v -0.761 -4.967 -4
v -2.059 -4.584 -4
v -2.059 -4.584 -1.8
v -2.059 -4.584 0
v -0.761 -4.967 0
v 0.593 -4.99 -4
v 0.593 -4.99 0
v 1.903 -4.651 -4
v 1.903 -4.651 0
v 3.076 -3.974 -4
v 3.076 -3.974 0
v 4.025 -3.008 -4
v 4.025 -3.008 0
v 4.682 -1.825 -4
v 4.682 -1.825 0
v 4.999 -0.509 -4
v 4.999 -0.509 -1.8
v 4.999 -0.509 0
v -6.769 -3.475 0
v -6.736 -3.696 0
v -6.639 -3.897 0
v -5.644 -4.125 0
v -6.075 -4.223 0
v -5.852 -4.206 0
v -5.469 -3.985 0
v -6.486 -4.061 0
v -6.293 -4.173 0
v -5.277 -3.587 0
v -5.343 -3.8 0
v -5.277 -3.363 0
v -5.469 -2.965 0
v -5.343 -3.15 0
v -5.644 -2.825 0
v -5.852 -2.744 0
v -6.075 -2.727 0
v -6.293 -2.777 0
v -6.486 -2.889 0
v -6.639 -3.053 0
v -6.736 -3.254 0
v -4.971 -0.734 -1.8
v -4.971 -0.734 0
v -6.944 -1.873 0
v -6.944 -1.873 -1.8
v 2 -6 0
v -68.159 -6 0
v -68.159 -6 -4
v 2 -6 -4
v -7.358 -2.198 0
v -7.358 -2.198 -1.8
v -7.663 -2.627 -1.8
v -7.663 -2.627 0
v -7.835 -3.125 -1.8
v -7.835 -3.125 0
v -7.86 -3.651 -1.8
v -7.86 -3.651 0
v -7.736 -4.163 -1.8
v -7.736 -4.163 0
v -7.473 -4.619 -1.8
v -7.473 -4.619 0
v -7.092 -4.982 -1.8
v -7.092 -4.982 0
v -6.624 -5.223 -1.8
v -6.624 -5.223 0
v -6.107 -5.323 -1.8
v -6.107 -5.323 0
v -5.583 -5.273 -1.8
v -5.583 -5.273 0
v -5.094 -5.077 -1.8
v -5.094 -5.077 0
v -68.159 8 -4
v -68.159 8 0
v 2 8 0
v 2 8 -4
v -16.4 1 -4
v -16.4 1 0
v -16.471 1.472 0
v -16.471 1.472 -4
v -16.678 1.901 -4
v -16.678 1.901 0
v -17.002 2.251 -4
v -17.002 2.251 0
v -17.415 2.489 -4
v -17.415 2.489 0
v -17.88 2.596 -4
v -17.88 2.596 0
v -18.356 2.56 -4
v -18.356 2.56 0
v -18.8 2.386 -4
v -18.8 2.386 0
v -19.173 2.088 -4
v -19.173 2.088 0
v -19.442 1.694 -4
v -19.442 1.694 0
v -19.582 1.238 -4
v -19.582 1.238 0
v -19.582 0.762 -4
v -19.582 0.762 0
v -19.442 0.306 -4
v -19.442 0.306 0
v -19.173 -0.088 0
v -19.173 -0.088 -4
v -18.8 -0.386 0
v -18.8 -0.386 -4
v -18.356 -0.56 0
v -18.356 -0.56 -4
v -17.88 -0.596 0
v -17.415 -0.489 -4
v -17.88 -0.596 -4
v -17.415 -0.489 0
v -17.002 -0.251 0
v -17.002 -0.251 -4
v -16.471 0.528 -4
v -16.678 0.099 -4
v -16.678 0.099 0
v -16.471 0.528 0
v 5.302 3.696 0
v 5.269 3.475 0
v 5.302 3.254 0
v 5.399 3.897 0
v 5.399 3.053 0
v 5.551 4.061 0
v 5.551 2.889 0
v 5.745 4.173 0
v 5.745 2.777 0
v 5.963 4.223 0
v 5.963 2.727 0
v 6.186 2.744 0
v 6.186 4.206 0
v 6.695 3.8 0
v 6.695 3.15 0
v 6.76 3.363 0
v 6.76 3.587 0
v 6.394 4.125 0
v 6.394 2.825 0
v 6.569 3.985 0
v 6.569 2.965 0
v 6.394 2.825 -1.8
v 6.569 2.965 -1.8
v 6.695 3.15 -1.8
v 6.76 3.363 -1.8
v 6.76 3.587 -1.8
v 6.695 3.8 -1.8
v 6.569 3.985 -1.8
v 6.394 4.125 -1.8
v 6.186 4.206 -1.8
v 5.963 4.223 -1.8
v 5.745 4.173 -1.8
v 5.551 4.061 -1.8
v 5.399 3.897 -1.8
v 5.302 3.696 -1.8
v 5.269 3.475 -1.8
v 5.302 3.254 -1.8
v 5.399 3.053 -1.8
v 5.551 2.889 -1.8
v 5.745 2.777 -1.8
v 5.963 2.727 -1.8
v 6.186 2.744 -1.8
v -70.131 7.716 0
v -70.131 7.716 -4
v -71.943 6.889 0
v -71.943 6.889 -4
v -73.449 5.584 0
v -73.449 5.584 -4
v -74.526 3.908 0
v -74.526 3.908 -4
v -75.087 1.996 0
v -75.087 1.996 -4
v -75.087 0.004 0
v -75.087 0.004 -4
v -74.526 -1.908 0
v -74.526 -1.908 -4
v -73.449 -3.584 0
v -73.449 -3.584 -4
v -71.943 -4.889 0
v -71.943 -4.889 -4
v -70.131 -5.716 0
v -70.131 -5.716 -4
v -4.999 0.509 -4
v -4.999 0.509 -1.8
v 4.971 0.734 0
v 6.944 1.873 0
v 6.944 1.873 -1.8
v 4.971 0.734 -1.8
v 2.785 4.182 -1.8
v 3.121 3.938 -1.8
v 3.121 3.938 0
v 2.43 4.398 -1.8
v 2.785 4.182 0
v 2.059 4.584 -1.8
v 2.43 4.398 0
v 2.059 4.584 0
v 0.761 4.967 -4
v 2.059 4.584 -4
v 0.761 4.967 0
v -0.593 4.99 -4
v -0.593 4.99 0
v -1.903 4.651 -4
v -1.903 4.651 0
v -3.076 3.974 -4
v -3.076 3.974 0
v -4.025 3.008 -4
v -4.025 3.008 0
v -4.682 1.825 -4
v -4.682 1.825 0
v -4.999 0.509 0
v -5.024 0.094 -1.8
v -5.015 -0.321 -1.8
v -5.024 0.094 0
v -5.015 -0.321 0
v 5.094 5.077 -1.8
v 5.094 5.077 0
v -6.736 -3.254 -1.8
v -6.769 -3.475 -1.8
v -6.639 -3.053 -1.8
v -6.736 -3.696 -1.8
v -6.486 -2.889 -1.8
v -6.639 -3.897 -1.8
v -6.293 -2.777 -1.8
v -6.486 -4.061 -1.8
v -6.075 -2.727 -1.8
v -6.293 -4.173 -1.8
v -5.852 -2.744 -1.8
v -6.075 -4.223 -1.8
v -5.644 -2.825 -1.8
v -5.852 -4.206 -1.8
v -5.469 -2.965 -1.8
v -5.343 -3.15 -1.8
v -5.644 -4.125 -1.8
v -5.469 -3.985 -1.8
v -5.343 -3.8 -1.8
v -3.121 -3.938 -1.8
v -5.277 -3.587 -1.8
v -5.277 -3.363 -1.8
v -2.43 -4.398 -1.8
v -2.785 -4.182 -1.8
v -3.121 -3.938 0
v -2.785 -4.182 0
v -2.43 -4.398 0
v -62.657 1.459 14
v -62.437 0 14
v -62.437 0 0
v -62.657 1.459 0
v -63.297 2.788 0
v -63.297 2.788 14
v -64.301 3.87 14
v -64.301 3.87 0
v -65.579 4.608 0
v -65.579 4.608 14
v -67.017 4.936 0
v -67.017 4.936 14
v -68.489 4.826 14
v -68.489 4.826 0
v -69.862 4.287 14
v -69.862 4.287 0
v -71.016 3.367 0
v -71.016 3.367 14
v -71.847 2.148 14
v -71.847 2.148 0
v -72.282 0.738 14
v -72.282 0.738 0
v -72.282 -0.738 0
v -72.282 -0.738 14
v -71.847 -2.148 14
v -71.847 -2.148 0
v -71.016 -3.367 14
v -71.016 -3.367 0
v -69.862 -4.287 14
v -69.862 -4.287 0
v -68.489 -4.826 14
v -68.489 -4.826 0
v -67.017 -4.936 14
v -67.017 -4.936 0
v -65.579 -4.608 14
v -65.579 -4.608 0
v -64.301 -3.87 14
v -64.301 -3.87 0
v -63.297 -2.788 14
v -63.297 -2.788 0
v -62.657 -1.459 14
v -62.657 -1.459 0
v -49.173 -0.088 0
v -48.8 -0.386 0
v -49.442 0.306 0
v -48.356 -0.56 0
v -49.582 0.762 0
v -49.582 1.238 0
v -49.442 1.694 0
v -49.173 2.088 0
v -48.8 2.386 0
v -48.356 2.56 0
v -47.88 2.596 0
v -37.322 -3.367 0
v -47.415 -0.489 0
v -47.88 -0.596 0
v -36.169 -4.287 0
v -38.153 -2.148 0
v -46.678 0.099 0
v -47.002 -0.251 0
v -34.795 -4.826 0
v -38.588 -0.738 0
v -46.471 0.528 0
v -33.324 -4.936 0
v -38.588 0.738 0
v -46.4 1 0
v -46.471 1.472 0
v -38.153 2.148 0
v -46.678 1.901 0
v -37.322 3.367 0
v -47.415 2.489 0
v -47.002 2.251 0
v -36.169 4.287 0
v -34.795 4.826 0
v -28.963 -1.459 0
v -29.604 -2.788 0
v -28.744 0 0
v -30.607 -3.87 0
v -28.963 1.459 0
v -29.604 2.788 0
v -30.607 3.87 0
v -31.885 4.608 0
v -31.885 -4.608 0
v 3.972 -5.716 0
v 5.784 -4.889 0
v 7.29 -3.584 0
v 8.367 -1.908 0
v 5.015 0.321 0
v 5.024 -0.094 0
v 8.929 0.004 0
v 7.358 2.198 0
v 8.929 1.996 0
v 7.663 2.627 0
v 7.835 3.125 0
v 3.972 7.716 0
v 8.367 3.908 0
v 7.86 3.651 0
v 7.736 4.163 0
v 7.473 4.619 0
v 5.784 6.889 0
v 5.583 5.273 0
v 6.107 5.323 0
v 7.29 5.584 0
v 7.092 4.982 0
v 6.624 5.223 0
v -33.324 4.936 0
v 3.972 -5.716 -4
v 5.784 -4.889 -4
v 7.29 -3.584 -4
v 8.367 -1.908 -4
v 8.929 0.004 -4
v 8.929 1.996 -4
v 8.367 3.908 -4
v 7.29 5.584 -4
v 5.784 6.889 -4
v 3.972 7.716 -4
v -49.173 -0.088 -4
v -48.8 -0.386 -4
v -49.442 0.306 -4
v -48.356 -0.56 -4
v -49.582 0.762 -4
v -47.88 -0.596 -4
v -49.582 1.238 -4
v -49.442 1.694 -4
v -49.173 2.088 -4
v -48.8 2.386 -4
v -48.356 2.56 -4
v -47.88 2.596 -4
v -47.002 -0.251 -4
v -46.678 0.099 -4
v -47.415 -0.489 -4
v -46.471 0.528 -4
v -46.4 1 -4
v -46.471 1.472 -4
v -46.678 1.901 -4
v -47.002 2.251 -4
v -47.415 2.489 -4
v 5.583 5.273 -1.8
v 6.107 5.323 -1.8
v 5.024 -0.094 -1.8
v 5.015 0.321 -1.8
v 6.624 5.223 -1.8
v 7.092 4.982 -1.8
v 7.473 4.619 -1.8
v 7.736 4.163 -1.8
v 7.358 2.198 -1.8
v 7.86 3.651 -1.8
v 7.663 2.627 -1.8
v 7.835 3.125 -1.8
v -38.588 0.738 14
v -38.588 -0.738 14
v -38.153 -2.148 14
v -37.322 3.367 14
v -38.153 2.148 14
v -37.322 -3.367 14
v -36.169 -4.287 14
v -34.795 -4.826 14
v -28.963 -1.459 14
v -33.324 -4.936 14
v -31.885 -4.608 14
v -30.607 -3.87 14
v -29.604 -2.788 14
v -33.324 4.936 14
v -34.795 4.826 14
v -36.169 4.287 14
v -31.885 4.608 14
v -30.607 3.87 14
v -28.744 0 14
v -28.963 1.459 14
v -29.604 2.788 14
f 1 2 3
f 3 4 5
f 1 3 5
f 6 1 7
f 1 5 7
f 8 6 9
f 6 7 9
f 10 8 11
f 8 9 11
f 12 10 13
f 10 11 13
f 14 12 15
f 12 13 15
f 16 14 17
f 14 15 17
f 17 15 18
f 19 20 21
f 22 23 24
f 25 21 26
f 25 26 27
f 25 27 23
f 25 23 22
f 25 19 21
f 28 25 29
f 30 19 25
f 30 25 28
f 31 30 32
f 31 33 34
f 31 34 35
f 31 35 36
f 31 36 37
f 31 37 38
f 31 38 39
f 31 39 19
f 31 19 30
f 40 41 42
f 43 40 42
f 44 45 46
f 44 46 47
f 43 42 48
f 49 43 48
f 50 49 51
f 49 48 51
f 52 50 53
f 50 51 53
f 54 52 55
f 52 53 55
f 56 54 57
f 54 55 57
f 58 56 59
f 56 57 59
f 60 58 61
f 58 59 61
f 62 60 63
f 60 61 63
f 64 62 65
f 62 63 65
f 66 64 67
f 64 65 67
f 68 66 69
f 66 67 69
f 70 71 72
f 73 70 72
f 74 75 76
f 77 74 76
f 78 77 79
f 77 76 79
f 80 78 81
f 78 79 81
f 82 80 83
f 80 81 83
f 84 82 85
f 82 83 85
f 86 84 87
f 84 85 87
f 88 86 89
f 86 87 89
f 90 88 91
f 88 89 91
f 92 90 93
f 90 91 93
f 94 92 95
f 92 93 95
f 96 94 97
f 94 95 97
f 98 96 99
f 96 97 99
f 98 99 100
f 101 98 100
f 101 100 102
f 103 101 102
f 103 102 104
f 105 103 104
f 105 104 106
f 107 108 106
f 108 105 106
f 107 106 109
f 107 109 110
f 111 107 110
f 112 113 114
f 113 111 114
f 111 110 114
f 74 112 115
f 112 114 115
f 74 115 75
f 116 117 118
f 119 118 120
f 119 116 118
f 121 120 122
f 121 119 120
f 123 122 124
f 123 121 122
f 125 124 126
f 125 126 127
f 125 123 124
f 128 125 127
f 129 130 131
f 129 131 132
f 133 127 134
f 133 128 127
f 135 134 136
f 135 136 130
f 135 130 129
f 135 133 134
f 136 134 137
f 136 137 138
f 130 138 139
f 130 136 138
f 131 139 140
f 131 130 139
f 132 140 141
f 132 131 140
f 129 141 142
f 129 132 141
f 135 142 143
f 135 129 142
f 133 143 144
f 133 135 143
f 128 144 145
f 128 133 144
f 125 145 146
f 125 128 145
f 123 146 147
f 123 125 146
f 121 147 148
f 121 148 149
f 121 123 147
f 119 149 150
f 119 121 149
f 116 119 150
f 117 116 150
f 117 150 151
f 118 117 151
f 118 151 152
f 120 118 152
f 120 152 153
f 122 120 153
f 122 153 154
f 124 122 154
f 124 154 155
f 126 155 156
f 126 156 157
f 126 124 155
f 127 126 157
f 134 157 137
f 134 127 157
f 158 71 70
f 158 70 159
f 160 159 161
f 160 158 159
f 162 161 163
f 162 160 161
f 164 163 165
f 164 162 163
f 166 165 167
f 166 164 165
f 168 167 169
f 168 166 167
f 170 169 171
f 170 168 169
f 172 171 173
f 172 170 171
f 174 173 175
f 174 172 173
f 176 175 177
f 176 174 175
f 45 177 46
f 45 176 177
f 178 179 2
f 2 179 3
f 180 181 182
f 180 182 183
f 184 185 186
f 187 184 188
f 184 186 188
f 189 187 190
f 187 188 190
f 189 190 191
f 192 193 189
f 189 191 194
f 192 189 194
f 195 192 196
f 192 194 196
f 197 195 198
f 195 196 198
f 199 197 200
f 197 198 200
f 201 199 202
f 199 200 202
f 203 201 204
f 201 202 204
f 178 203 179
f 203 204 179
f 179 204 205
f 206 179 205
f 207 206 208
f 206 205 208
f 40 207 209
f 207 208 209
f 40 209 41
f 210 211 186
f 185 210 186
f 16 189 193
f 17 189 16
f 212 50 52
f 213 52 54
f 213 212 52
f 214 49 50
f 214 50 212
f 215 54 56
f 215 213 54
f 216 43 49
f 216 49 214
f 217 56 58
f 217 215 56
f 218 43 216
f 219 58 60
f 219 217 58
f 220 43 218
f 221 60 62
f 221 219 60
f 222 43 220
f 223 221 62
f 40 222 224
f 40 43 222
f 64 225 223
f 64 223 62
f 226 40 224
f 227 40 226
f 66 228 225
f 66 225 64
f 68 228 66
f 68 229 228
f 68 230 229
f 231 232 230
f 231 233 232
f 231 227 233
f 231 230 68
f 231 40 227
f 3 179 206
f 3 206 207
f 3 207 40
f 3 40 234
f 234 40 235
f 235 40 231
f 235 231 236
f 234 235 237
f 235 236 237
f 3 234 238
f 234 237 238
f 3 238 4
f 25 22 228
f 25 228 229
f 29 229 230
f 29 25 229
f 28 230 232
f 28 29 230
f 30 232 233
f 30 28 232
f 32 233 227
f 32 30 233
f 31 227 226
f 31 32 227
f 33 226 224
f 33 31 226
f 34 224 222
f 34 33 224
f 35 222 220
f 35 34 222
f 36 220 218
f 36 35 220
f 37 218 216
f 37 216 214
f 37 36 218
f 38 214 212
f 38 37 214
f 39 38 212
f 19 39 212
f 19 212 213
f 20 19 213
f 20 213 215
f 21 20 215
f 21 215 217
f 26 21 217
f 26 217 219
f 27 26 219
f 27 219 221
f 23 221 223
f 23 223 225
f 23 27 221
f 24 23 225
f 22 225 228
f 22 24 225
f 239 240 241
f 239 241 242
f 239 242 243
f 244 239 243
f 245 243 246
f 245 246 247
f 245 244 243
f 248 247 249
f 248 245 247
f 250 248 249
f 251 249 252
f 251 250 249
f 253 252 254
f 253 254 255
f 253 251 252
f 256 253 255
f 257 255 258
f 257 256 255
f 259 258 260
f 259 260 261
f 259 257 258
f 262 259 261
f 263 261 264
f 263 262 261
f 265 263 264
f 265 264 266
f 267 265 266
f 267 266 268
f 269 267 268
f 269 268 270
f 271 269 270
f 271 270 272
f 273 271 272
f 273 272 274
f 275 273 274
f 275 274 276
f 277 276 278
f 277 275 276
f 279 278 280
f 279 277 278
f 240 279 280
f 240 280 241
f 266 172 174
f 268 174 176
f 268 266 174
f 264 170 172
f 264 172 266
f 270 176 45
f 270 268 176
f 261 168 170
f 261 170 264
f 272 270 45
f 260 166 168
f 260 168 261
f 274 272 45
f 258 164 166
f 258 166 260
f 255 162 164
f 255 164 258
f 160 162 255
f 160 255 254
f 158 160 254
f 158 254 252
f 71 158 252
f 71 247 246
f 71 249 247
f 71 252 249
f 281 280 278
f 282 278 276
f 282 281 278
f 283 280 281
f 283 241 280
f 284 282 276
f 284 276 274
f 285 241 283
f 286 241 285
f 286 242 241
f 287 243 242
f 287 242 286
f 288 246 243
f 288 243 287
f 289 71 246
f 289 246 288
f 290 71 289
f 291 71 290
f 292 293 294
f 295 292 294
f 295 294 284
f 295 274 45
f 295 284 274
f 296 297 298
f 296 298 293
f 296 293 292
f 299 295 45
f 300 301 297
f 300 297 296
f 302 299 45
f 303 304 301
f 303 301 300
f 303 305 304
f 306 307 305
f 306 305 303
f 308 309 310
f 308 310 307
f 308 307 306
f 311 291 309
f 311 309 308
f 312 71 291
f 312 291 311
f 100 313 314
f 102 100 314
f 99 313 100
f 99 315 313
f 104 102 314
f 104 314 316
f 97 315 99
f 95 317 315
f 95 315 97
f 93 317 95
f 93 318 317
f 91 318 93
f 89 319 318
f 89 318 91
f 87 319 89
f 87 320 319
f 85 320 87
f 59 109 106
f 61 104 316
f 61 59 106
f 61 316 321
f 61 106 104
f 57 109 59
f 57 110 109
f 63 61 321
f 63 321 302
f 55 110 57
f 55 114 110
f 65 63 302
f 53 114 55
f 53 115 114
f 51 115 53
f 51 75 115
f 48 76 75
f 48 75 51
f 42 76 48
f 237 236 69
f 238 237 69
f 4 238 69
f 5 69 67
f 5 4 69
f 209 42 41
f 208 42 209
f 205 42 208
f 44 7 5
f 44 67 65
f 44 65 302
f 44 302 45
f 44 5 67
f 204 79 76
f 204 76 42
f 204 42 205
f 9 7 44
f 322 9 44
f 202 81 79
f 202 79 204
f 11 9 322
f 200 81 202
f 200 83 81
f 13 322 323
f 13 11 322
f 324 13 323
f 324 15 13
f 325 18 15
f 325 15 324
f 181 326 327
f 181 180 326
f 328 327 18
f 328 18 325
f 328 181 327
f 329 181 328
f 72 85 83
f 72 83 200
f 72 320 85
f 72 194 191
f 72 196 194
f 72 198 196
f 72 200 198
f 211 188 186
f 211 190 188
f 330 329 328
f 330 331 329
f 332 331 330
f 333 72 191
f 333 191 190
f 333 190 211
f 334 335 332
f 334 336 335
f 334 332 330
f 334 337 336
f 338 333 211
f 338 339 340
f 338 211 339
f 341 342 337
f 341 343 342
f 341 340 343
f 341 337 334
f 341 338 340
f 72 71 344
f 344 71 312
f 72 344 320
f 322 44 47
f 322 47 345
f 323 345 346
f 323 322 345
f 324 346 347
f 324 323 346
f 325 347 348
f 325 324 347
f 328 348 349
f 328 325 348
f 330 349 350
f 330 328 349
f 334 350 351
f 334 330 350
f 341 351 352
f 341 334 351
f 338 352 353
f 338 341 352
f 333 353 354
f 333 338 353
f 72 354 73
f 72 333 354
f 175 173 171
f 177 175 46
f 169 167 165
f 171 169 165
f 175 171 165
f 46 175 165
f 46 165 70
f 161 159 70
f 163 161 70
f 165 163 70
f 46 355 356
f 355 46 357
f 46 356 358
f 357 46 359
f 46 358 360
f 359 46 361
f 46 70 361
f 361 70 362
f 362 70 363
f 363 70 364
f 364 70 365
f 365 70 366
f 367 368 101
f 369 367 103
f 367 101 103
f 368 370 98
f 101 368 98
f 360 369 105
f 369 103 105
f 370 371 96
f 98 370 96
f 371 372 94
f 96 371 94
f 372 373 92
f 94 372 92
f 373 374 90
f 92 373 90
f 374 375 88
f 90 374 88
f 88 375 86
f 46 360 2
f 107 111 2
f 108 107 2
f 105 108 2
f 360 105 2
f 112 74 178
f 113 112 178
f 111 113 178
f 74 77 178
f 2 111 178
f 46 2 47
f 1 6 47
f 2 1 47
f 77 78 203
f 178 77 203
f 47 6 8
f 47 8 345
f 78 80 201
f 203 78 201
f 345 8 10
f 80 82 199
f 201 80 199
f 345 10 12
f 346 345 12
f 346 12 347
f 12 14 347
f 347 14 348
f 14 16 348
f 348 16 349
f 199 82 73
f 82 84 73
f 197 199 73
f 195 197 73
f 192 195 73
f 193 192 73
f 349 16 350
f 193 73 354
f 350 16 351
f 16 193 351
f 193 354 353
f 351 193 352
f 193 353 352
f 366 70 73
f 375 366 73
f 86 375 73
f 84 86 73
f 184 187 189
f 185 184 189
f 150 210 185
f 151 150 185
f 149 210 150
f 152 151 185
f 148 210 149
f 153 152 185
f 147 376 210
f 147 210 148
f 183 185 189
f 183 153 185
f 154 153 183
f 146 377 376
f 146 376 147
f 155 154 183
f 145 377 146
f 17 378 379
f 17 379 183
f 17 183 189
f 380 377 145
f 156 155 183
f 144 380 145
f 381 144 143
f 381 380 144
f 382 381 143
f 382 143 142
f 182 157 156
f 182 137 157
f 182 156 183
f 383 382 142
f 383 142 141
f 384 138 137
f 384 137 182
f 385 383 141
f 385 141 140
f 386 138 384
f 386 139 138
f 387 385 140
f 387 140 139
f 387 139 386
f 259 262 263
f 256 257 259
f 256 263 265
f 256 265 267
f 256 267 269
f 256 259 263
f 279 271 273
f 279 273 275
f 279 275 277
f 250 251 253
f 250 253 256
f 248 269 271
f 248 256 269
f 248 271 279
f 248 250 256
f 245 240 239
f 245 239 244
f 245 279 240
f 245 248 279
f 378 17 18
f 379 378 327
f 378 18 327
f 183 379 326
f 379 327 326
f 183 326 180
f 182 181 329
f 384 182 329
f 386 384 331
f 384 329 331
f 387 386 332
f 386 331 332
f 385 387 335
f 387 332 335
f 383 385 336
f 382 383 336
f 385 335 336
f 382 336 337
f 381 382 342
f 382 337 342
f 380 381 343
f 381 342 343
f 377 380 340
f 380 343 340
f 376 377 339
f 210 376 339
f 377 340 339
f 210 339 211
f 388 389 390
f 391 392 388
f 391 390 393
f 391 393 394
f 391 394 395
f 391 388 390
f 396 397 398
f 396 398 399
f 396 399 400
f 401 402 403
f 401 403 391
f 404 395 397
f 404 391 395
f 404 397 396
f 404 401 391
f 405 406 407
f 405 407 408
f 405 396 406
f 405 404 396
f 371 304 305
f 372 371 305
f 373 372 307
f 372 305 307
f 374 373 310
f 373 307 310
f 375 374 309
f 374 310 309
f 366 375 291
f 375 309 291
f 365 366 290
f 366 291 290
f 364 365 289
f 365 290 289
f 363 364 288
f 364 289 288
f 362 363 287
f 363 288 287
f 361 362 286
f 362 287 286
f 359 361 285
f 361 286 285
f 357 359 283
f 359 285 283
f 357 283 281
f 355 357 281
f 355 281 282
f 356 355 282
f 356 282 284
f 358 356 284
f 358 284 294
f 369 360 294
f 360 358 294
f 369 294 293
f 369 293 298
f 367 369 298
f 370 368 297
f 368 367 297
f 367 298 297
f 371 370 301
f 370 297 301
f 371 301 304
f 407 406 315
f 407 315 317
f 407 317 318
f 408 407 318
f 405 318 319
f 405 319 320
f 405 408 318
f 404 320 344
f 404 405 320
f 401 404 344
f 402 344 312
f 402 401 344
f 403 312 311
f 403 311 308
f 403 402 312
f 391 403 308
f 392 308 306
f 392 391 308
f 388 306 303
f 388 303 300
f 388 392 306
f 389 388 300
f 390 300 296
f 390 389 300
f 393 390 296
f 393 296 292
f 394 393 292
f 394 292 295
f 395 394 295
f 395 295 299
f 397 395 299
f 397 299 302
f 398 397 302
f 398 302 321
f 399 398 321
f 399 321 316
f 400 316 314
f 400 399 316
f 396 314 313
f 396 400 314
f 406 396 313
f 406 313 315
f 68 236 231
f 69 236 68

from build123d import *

# Parameters (mm, degrees)
CYLINDER018_R        = 1.6
CYLINDER018_DEPTH    = 10
CYLINDER017_R        = 1.6
CYLINDER017_DEPTH    = 10
PAD_DEPTH            = 18
SKETCH002_R          = 0.75
PAD001_DEPTH         = 1.8
CYLINDER_R           = 5.025
CYLINDER_DEPTH       = 1.8
BODY_PLACEMENT_ANGLE = 60
CYLINDER006_R        = 4.95
CYLINDER006_DEPTH    = 14
EXTRUDE_DEPTH        = 4
CYLINDER005_R        = 4.95
CYLINDER005_DEPTH    = 14


with BuildPart() as cylinder018:
    # Cylinder018 → Cylinder018 (new body)
    with BuildSketch(Plane(origin=(-30, 0, -3), x_dir=(1, 0, 0), z_dir=(0, 0, 1))):
        Circle(CYLINDER018_R)
    extrude(amount=CYLINDER018_DEPTH)


with BuildPart() as fusion021:
    # Cylinder017 → Cylinder017 (new body)
    with BuildSketch(Plane.XY.offset(-3)):
        Circle(CYLINDER017_R)
    extrude(amount=CYLINDER017_DEPTH)

    # Fusion019: union Cylinder018
    add(cylinder018.part)


with BuildPart() as fusion021_1:
    # Fusion019 placement: moved
    add(fusion021.part.moved(Location((-18, 1, 0))))


with BuildPart() as motorbody:
    # Sketch001 → Pad (new body)
    with BuildSketch(Plane.XY):
        with BuildLine():
            ThreePointArc((-2.940238, 4.075), (-5.025, 0), (-2.940238, -4.075))
            Line((-2.940238, -4.075), (2.940238, -4.075))
            ThreePointArc((2.940238, -4.075), (5.025, 0), (2.940238, 4.075))
            Line((-2.940238, 4.075), (2.940238, 4.075))
        make_face()
    extrude(amount=PAD_DEPTH)

    # Sketch002 → Pad001 (join)
    with BuildSketch(Plane.XY):
        with BuildLine():
            ThreePointArc((1.85, 6.95), (0, 8.8), (-1.85, 6.95))
            Line((-1.85, 6.95), (-1.85, -6.950003))
            ThreePointArc((-1.85, -6.950003), (2e-06, -8.8), (1.85, -6.949999))
            Line((1.85, 6.95), (1.85, -6.949999))
        make_face()
        with Locations((0, 6.95)):
            Circle(SKETCH002_R, mode=Mode.SUBTRACT)
        with Locations((0, -6.95)):
            Circle(SKETCH002_R, mode=Mode.SUBTRACT)
    extrude(amount=PAD001_DEPTH)

    # Cylinder → Cylinder (join)
    with BuildSketch(Plane.XY):
        Circle(CYLINDER_R)
    extrude(amount=CYLINDER_DEPTH)


with BuildPart() as motorbody_1:
    # Body placement: moved
    add(motorbody.part.rotate(Axis((0, 0, 0), (0, 0, -1)), BODY_PLACEMENT_ANGLE))


with BuildPart() as cylinder006:
    # Cylinder006 → Cylinder006 (new body)
    with BuildSketch(Plane(origin=(-33.693581, 0, -14), x_dir=(1, 0, 0), z_dir=(0, 0, 1))):
        Circle(CYLINDER006_R)
    extrude(amount=CYLINDER006_DEPTH)


with BuildPart() as extrude_body:
    # Sketch009 → Extrude (new body)
    with BuildSketch(Plane.XY):
        with BuildLine():
            ThreePointArc((-68.158607, 8), (-75.158607, 1), (-68.158607, -6))
            Line((-68.158607, -6), (2, -6))
            ThreePointArc((2, -6), (9, 1), (2, 8))
            Line((-68.158607, 8), (2, 8))
        make_face()
    extrude(amount=EXTRUDE_DEPTH)


with BuildPart() as rightdriveskid:
    # Cylinder005 → Cylinder005 (new body)
    with BuildSketch(Plane(origin=(-67.3872, 0, -14), x_dir=(1, 0, 0), z_dir=(0, 0, 1))):
        Circle(CYLINDER005_R)
    extrude(amount=CYLINDER005_DEPTH)

    # Fusion005: union Cylinder006, Extrude body
    add(cylinder006.part)
    add(extrude_body.part)

    # Cut002: cut MotorBody
    add(motorbody_1.part, mode=Mode.SUBTRACT)

    # Cut011: cut Fusion021
    add(fusion021_1.part, mode=Mode.SUBTRACT)


with BuildPart() as leftdriveskid:
    # Part__Mirroring003: instance of RightDriveSkid
    add(rightdriveskid.part.mirror(Plane(origin=(0, 0, 0), x_dir=(0, 1, 0), z_dir=(0, 0, 1))))


solid = leftdriveskid.part
